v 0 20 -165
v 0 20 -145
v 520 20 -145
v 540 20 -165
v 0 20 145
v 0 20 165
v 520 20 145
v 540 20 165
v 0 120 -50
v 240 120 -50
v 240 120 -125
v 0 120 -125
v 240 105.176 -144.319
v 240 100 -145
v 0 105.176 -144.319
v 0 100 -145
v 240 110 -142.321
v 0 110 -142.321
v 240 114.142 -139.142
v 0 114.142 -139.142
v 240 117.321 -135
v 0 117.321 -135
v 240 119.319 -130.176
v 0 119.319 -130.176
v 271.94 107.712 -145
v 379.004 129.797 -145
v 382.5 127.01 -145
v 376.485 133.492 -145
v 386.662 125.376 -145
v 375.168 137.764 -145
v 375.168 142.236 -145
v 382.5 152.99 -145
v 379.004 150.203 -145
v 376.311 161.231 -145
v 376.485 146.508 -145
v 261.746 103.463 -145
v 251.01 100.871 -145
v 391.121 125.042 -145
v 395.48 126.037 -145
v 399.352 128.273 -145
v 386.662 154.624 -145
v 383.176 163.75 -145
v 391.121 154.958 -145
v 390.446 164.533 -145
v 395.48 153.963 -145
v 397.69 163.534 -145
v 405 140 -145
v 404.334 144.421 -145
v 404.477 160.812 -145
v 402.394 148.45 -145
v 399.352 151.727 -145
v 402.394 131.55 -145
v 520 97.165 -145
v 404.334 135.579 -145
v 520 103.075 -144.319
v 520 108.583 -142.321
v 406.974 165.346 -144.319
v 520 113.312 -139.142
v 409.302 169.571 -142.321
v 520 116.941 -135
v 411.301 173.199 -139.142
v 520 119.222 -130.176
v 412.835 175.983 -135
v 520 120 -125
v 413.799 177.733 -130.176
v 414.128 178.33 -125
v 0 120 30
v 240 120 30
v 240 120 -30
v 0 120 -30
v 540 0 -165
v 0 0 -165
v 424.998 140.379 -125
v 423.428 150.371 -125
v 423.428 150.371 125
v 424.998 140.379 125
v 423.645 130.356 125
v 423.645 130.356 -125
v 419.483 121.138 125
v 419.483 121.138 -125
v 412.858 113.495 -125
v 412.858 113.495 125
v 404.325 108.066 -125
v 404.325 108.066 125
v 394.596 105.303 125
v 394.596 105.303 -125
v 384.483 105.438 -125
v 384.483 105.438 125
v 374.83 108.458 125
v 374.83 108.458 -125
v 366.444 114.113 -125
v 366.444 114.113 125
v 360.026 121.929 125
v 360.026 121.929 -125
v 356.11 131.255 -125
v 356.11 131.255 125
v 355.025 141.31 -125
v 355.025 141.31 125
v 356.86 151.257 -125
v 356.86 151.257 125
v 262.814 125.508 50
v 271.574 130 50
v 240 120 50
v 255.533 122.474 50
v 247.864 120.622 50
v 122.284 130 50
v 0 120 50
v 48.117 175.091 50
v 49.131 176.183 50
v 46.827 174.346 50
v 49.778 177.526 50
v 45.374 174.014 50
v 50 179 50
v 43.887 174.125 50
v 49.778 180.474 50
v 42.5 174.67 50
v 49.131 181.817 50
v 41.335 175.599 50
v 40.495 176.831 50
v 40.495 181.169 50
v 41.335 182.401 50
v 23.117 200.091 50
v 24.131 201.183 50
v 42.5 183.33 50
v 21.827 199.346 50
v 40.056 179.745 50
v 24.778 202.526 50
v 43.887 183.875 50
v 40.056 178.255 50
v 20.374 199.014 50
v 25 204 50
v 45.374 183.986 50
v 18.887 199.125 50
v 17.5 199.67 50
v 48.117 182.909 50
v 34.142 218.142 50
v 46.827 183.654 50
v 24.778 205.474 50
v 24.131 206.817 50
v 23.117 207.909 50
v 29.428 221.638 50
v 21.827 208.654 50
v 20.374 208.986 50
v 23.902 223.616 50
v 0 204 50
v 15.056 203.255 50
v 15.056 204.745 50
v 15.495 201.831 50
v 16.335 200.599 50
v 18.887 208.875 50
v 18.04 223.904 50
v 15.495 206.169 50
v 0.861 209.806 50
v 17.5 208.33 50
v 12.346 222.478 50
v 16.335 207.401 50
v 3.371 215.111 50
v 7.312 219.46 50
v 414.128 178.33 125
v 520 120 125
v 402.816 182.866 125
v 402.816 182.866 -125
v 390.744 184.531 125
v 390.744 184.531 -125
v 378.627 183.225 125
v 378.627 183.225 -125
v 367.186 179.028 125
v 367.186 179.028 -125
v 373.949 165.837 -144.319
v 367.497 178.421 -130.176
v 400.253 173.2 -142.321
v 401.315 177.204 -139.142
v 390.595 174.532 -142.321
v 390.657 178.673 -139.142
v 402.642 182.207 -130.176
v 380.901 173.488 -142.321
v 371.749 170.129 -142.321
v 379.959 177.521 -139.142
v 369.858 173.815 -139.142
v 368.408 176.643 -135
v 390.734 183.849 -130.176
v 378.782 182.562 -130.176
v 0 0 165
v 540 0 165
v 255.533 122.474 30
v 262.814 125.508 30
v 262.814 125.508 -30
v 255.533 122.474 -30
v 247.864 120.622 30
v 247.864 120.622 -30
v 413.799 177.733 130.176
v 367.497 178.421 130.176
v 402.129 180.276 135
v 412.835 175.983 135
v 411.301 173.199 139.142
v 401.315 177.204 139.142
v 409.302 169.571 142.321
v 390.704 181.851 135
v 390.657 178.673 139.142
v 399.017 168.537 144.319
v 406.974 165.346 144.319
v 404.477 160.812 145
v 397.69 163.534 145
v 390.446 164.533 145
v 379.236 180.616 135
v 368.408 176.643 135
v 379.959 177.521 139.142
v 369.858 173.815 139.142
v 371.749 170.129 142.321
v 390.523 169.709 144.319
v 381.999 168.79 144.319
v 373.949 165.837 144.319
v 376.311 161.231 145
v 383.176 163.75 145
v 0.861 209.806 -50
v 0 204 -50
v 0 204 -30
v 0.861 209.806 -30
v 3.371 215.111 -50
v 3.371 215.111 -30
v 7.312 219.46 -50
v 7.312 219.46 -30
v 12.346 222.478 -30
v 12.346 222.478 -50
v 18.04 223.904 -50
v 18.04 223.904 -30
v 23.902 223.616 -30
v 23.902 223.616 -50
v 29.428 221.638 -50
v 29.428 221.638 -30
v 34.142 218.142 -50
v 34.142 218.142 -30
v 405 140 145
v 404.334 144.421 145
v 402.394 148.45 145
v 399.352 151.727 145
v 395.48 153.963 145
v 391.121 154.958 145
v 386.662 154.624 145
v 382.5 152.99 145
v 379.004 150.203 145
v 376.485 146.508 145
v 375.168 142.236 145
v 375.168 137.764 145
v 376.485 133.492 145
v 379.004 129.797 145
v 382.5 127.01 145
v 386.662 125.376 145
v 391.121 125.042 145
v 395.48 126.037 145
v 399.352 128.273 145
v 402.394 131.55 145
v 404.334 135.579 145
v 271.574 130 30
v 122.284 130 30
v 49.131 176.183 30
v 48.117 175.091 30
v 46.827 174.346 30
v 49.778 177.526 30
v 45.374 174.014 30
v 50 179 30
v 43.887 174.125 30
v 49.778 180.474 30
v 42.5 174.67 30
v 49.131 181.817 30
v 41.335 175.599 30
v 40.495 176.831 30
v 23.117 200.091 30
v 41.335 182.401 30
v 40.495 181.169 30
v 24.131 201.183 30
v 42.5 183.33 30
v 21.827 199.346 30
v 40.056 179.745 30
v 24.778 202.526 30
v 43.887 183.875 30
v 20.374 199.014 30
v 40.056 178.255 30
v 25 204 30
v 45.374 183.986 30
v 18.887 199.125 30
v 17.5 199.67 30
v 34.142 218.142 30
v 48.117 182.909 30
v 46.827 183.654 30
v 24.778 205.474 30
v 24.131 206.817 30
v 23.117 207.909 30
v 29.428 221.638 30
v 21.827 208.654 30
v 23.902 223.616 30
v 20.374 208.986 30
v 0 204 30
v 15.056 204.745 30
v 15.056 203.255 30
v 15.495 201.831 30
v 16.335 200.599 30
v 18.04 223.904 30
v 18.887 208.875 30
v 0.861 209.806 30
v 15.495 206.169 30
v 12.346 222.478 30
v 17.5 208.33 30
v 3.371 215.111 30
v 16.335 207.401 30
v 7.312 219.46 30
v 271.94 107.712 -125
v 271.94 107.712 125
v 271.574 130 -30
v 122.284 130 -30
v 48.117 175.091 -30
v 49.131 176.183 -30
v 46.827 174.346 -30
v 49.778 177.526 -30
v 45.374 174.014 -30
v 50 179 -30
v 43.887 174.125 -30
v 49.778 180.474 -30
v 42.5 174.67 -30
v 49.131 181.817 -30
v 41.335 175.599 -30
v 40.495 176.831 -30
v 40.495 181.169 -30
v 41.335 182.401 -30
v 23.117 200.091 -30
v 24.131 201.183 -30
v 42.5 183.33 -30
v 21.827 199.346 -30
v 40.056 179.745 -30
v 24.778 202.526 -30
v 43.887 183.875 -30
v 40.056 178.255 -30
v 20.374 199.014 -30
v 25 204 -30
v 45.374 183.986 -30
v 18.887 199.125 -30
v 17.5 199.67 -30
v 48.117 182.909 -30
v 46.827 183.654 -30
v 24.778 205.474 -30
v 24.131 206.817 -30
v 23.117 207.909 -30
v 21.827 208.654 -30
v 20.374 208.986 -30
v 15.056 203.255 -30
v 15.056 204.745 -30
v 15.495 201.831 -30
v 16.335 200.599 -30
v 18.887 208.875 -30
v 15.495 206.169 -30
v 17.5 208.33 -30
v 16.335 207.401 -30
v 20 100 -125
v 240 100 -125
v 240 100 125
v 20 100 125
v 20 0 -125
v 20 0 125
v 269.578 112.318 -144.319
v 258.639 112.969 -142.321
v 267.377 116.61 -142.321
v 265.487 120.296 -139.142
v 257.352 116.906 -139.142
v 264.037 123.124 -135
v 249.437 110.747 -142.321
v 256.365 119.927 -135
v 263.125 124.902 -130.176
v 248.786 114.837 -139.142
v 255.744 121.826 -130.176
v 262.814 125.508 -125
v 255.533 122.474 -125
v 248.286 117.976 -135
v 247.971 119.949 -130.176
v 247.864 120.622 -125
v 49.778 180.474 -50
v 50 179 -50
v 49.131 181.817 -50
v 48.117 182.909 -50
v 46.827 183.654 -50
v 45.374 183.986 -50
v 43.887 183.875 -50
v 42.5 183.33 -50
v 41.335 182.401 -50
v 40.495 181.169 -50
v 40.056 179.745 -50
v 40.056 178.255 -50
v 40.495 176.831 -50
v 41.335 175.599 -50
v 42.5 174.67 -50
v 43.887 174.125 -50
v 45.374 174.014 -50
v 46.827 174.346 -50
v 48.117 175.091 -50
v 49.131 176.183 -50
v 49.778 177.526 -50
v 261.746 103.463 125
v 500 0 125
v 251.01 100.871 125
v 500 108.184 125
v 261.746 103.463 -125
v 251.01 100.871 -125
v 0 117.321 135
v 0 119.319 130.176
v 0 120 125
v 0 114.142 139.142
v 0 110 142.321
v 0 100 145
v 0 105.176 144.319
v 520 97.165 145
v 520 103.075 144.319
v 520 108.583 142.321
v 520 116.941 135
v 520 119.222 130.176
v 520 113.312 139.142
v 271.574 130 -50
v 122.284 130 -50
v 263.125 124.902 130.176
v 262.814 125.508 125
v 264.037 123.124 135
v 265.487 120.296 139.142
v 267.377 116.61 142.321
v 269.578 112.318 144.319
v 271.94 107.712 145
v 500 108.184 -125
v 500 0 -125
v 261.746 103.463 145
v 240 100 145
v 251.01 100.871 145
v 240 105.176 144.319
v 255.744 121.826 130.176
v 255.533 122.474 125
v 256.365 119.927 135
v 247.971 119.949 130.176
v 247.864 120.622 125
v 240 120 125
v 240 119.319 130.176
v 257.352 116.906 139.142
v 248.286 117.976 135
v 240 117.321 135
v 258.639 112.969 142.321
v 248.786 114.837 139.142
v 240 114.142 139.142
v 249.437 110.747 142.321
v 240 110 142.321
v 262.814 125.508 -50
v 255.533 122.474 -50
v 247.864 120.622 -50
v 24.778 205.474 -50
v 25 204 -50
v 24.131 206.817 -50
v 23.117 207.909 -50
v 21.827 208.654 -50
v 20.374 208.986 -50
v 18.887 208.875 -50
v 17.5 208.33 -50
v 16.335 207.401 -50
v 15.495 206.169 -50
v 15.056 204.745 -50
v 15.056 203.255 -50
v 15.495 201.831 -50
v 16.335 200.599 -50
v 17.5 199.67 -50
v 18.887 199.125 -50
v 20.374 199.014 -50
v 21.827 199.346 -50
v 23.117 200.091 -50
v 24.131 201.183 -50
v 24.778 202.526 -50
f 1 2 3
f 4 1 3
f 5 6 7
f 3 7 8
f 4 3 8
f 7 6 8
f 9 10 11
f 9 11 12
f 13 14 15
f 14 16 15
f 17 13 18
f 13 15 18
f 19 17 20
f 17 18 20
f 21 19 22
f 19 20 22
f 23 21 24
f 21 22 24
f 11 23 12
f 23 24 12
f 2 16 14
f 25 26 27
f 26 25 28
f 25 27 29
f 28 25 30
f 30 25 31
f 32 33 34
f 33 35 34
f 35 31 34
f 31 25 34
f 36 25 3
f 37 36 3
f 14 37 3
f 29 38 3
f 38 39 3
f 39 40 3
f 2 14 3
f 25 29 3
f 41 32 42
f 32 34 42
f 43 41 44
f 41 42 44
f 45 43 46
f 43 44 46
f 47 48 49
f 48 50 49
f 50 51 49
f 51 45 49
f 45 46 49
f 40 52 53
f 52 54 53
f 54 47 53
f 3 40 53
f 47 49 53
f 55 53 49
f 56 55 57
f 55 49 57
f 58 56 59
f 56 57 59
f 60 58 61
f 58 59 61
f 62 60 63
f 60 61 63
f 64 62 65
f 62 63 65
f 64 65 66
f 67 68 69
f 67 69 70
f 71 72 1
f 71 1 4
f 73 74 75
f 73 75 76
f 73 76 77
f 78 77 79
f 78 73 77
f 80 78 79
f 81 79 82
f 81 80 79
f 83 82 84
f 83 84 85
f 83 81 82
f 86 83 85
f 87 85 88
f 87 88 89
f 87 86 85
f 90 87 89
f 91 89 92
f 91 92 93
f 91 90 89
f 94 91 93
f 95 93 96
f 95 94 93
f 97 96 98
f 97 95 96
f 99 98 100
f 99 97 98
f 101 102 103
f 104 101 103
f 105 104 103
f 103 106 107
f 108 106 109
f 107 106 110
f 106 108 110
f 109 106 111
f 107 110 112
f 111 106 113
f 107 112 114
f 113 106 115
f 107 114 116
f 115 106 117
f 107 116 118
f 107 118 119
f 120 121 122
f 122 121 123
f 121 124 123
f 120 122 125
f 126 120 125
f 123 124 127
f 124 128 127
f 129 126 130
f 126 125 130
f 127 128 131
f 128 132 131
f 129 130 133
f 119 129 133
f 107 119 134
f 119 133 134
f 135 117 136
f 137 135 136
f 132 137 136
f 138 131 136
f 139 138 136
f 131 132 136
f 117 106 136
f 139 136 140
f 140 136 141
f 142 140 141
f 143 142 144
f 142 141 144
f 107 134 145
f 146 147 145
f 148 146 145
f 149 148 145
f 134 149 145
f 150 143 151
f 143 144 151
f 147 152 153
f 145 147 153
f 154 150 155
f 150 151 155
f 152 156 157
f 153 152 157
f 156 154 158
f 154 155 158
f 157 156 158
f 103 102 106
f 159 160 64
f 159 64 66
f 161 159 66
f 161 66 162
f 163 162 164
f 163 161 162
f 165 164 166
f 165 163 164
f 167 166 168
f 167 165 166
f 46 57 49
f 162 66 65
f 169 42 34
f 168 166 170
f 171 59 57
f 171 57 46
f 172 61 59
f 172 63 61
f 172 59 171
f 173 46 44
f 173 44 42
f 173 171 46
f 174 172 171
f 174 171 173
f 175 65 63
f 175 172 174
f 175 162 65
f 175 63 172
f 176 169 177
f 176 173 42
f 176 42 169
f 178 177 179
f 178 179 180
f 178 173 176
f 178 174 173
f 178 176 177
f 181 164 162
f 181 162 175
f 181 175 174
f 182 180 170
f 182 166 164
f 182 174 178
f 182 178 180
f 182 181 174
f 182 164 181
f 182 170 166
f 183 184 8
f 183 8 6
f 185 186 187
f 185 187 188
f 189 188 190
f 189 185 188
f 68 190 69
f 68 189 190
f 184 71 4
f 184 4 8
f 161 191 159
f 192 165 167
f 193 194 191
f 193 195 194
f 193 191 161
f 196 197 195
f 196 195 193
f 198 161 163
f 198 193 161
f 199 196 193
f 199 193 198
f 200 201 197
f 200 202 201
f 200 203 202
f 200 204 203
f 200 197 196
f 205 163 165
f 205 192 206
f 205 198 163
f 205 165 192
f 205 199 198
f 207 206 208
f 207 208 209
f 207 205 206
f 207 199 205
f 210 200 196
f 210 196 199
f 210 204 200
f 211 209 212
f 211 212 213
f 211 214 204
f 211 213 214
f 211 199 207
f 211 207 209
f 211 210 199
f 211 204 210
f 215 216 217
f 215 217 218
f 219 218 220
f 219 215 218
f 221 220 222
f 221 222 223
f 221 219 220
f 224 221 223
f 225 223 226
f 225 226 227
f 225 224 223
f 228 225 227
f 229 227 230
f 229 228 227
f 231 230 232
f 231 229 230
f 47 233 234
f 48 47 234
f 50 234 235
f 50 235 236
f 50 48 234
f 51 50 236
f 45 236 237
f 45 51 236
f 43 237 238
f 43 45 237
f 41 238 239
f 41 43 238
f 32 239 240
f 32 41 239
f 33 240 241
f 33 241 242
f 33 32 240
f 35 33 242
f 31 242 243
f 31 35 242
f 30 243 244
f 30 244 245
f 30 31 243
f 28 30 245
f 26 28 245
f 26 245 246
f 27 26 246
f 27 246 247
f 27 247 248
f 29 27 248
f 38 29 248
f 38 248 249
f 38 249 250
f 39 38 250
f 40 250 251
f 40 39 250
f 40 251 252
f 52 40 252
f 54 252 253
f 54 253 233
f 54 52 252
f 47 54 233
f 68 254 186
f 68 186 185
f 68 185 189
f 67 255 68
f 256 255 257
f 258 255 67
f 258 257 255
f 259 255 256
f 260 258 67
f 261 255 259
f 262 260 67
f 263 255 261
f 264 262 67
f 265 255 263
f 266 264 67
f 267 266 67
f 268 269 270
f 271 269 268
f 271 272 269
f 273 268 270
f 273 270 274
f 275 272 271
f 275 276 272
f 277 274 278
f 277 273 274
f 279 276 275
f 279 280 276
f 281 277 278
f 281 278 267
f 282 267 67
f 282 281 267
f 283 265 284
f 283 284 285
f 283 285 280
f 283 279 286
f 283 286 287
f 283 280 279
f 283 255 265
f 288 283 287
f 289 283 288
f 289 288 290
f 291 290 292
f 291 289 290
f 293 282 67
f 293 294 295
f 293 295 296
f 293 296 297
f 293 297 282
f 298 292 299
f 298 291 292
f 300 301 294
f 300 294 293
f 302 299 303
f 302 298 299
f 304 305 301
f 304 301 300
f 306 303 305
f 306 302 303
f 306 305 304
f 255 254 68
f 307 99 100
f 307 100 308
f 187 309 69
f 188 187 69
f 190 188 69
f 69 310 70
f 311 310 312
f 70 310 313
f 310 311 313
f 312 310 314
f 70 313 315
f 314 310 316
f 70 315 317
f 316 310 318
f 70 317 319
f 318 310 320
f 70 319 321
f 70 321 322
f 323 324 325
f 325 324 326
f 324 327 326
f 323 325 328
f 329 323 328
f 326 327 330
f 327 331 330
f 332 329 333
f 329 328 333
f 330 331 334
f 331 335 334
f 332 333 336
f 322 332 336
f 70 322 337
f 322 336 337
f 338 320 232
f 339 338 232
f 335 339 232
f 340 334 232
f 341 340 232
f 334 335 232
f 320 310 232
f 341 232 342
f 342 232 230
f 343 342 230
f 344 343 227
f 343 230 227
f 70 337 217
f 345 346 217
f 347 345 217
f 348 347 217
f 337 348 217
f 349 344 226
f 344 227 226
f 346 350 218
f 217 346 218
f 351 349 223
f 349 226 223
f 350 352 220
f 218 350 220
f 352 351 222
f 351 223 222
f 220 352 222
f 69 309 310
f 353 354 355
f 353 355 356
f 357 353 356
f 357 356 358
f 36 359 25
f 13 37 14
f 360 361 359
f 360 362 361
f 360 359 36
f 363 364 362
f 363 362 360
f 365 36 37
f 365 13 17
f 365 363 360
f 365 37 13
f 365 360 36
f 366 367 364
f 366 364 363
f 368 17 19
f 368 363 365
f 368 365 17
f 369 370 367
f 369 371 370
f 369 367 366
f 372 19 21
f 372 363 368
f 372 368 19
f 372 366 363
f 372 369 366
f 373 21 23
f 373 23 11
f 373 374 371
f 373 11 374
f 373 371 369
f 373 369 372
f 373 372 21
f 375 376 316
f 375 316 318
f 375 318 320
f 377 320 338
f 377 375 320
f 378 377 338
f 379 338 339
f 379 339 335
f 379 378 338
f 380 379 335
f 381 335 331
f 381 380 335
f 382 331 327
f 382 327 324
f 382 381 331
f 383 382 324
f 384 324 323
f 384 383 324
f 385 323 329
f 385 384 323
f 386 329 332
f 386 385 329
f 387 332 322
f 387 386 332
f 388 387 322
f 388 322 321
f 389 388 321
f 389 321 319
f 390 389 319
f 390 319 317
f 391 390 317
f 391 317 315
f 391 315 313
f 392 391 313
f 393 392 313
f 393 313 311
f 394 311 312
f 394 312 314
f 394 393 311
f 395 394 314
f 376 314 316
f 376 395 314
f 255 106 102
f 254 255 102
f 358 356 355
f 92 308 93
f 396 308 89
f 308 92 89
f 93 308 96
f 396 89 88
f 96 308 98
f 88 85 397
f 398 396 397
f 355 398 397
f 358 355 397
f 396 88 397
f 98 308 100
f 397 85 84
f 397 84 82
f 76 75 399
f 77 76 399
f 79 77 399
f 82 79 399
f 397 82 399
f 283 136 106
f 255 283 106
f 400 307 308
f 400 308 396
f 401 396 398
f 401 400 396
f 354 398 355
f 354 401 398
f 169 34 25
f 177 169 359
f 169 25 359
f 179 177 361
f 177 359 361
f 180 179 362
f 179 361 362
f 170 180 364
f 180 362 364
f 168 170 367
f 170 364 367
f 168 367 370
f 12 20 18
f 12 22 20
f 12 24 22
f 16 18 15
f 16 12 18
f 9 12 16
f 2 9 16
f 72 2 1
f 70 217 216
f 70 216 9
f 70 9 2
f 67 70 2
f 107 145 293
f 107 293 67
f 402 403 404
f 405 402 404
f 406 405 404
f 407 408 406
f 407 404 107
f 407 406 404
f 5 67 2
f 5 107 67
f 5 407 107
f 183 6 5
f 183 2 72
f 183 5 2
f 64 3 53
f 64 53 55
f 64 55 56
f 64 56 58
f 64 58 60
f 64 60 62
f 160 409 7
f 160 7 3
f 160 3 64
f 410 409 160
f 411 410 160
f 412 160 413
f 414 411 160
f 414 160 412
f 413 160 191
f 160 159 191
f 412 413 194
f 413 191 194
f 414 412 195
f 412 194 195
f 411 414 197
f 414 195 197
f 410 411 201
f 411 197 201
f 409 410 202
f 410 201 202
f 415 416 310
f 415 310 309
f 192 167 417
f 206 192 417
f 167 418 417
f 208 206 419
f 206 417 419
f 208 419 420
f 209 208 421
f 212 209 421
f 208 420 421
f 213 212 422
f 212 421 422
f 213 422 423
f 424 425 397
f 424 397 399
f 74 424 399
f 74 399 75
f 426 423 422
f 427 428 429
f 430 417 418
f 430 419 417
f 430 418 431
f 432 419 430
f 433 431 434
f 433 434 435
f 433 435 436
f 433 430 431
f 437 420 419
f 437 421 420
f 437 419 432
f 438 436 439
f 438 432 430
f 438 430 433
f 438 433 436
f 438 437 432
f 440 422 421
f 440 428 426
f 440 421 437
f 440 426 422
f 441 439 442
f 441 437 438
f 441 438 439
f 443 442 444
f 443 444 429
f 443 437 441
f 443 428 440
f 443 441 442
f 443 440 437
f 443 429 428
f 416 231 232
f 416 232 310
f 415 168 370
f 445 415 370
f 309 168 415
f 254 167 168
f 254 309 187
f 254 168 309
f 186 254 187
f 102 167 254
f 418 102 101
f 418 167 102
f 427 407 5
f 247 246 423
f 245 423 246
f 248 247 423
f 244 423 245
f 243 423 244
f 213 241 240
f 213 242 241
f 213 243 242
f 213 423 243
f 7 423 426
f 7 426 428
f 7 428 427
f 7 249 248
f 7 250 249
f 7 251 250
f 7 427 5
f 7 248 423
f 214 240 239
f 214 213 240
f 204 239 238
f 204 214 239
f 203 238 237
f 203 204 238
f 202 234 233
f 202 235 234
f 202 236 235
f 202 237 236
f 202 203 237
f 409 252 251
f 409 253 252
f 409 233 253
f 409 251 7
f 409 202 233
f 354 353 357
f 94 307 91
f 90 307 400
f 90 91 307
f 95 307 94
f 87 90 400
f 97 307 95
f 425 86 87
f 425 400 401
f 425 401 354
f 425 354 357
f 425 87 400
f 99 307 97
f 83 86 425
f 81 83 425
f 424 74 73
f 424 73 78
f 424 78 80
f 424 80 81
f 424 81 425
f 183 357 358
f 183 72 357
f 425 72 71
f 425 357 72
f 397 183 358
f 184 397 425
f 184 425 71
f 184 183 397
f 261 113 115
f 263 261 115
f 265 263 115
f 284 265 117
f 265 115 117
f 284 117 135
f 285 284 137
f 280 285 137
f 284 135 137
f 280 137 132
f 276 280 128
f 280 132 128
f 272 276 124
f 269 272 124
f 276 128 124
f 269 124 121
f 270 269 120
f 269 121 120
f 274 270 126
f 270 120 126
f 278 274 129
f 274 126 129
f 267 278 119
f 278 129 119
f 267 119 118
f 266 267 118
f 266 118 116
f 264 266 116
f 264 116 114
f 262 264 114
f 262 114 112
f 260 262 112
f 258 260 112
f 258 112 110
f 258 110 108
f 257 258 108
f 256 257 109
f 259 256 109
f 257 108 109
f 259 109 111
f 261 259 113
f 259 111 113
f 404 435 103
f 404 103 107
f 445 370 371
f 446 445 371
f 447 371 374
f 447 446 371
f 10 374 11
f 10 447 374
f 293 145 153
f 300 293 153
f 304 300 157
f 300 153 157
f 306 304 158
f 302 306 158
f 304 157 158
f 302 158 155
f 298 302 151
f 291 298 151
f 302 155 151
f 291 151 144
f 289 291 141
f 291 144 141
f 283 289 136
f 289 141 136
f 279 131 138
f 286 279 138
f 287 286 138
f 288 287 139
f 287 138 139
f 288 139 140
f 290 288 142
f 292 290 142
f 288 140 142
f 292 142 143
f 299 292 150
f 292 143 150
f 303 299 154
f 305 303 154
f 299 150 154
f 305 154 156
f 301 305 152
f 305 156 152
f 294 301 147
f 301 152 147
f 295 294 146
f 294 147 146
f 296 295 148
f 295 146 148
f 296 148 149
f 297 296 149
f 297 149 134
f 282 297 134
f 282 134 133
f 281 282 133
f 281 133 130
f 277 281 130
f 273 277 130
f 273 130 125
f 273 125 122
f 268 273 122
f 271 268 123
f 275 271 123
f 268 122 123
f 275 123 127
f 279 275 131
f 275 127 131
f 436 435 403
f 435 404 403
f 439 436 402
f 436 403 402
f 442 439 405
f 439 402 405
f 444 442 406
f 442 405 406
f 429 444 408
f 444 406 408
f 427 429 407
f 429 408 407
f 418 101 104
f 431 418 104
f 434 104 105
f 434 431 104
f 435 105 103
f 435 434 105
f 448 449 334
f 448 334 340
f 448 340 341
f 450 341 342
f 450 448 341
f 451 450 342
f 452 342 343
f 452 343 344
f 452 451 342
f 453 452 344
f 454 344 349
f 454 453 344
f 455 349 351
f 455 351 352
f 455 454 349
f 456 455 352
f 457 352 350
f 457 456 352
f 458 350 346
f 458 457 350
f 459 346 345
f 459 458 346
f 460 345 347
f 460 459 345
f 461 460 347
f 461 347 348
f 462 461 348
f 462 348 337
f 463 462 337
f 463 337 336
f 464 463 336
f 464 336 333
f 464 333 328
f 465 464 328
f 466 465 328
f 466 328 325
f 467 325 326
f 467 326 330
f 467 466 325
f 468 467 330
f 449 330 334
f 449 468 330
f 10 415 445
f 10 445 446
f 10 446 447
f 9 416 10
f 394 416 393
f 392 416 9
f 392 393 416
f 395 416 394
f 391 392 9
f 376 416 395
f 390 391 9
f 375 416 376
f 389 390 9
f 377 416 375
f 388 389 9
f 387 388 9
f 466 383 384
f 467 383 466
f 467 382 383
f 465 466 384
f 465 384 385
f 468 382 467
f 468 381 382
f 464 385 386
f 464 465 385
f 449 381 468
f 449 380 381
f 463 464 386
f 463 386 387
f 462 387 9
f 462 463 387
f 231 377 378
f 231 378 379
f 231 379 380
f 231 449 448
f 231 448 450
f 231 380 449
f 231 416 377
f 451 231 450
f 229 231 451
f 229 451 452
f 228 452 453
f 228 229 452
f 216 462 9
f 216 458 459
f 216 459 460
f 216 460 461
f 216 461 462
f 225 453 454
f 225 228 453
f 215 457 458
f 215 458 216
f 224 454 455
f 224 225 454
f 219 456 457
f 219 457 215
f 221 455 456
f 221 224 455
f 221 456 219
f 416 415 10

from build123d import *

# Parameters (mm, degrees)
SKETCH1_R           = 15
BOSS_EXTRUDE2_DEPTH = 145
BOSS_EXTRUDE3_START = 50
SKETCH5_R           = 5
BOSS_EXTRUDE3_DEPTH = 20
SHELL1_START        = -125
SHELL1_DEPTH        = 250
SKETCH6_W           = 520
SKETCH6_H           = 290
BOSS_EXTRUDE4_DEPTH = 20
FILLET1_R           = 20


# Read off the part's stored shape, not the designer's step: Shell1
with BuildPart() as part:
    # Sketch1 → Boss-Extrude2 (new, symmetric)
    with BuildSketch(Plane.XY):
        with BuildLine():
            Line((0, 120), (0, 0))
            Line((0, 0), (520, 0))
            Line((520, 0), (520, 120))
            Line((520, 120), (414.127591904, 178.329519311))
            ThreePointArc((414.127591904, 178.329519311), (390.743657055, 184.530618142), (367.18562851, 179.027770991))
            Line((367.18562851, 179.027770991), (262.81437149, 125.508377715))
            ThreePointArc((262.81437149, 125.508377715), (251.734966676, 121.396599326), (240, 120))
            Line((240, 120), (0, 120))
        make_face()
        with Locations((390, 140)):
            Circle(SKETCH1_R, mode=Mode.SUBTRACT)
    extrude(amount=BOSS_EXTRUDE2_DEPTH, both=True)

    # Sketch5 → Boss-Extrude3 (add)
    with BuildSketch(Plane.XY.offset(BOSS_EXTRUDE3_START)):
        with BuildLine():
            Line((240, 120), (0, 120))
            Line((0, 120), (0, 204))
            ThreePointArc((0, 204), (12.346331353, 222.47759065), (34.142135624, 218.142135624))
            Line((34.142135624, 218.142135624), (122.284271247, 130))
            Line((122.284271247, 130), (271.573743284, 130))
            Line((271.573743284, 130), (262.81437149, 125.508377715))
            ThreePointArc((262.81437149, 125.508377715), (251.734966676, 121.396599326), (240, 120))
        make_face()
        with Locations((20, 204)):
            Circle(SKETCH5_R, mode=Mode.SUBTRACT)
        with Locations((45, 179)):
            Circle(SKETCH5_R, mode=Mode.SUBTRACT)
    extrude(amount=-BOSS_EXTRUDE3_DEPTH)

    # Mirror1: part across plane


with BuildPart() as part_1:
    add(part.part)
    add(part.part.mirror(Plane.XY))

    # Shell1 outline → Shell1 (cut)
    with BuildSketch(Plane.XY.offset(SHELL1_START)):
        with BuildLine():
            Line((356.85957207, 151.256644109), (271.940120086, 107.711728801))
            ThreePointArc((271.940120086, 107.711728801), (256.428953346, 101.955239056), (240, 100))
            Line((240, 100), (20, 100))
            Line((20, 100), (20, 0))
            Line((20, 0), (500, 0))
            Line((500, 0), (500, 108.184326651))
            Line((500, 108.184326651), (423.428190104, 150.370926015))
            ThreePointArc((423.428190104, 150.370926015), (389.534354317, 105.00309765), (356.85957207, 151.256644109))
        make_face()
    extrude(amount=SHELL1_DEPTH, mode=Mode.SUBTRACT)

    # Sketch6 → Boss-Extrude4 (add)
    # profile 1 of 2: a face of its own
    with BuildSketch(Plane.XZ):
        with Locations((260, 0)):
            Rectangle(SKETCH6_W, SKETCH6_H)
        Polygon((20, 125), (500, 125), (500, -125), (240, -125), (20, -125), align=None, mode=Mode.SUBTRACT)
    # profile 2 of 2: a face of its own
    with BuildSketch(Plane.XZ):
        Polygon((540, 165), (0, 165), (0, 145), (520, 145), (520, -145), (0, -145), (0, -165), (540, -165), align=None)
    extrude(amount=-BOSS_EXTRUDE4_DEPTH)

    # Fillet1
    fillet1_edges = [part_1.edges().sort_by_distance(p)[0] for p in [
        (120, 120, -145),
        (467.063795952, 149.164759656, 145),
        (390.743657055, 184.530618142, 145),
        (315, 152.268074353, 145),
        (251.734966676, 121.396599326, 145),
        (120, 120, 145),
        (251.734966676, 121.396599326, -145),
        (315, 152.268074353, -145),
        (390.743657055, 184.530618142, -145),
        (467.063795952, 149.164759656, -145),
    ]]
    fillet(fillet1_edges, radius=FILLET1_R)


solid = part_1.part
